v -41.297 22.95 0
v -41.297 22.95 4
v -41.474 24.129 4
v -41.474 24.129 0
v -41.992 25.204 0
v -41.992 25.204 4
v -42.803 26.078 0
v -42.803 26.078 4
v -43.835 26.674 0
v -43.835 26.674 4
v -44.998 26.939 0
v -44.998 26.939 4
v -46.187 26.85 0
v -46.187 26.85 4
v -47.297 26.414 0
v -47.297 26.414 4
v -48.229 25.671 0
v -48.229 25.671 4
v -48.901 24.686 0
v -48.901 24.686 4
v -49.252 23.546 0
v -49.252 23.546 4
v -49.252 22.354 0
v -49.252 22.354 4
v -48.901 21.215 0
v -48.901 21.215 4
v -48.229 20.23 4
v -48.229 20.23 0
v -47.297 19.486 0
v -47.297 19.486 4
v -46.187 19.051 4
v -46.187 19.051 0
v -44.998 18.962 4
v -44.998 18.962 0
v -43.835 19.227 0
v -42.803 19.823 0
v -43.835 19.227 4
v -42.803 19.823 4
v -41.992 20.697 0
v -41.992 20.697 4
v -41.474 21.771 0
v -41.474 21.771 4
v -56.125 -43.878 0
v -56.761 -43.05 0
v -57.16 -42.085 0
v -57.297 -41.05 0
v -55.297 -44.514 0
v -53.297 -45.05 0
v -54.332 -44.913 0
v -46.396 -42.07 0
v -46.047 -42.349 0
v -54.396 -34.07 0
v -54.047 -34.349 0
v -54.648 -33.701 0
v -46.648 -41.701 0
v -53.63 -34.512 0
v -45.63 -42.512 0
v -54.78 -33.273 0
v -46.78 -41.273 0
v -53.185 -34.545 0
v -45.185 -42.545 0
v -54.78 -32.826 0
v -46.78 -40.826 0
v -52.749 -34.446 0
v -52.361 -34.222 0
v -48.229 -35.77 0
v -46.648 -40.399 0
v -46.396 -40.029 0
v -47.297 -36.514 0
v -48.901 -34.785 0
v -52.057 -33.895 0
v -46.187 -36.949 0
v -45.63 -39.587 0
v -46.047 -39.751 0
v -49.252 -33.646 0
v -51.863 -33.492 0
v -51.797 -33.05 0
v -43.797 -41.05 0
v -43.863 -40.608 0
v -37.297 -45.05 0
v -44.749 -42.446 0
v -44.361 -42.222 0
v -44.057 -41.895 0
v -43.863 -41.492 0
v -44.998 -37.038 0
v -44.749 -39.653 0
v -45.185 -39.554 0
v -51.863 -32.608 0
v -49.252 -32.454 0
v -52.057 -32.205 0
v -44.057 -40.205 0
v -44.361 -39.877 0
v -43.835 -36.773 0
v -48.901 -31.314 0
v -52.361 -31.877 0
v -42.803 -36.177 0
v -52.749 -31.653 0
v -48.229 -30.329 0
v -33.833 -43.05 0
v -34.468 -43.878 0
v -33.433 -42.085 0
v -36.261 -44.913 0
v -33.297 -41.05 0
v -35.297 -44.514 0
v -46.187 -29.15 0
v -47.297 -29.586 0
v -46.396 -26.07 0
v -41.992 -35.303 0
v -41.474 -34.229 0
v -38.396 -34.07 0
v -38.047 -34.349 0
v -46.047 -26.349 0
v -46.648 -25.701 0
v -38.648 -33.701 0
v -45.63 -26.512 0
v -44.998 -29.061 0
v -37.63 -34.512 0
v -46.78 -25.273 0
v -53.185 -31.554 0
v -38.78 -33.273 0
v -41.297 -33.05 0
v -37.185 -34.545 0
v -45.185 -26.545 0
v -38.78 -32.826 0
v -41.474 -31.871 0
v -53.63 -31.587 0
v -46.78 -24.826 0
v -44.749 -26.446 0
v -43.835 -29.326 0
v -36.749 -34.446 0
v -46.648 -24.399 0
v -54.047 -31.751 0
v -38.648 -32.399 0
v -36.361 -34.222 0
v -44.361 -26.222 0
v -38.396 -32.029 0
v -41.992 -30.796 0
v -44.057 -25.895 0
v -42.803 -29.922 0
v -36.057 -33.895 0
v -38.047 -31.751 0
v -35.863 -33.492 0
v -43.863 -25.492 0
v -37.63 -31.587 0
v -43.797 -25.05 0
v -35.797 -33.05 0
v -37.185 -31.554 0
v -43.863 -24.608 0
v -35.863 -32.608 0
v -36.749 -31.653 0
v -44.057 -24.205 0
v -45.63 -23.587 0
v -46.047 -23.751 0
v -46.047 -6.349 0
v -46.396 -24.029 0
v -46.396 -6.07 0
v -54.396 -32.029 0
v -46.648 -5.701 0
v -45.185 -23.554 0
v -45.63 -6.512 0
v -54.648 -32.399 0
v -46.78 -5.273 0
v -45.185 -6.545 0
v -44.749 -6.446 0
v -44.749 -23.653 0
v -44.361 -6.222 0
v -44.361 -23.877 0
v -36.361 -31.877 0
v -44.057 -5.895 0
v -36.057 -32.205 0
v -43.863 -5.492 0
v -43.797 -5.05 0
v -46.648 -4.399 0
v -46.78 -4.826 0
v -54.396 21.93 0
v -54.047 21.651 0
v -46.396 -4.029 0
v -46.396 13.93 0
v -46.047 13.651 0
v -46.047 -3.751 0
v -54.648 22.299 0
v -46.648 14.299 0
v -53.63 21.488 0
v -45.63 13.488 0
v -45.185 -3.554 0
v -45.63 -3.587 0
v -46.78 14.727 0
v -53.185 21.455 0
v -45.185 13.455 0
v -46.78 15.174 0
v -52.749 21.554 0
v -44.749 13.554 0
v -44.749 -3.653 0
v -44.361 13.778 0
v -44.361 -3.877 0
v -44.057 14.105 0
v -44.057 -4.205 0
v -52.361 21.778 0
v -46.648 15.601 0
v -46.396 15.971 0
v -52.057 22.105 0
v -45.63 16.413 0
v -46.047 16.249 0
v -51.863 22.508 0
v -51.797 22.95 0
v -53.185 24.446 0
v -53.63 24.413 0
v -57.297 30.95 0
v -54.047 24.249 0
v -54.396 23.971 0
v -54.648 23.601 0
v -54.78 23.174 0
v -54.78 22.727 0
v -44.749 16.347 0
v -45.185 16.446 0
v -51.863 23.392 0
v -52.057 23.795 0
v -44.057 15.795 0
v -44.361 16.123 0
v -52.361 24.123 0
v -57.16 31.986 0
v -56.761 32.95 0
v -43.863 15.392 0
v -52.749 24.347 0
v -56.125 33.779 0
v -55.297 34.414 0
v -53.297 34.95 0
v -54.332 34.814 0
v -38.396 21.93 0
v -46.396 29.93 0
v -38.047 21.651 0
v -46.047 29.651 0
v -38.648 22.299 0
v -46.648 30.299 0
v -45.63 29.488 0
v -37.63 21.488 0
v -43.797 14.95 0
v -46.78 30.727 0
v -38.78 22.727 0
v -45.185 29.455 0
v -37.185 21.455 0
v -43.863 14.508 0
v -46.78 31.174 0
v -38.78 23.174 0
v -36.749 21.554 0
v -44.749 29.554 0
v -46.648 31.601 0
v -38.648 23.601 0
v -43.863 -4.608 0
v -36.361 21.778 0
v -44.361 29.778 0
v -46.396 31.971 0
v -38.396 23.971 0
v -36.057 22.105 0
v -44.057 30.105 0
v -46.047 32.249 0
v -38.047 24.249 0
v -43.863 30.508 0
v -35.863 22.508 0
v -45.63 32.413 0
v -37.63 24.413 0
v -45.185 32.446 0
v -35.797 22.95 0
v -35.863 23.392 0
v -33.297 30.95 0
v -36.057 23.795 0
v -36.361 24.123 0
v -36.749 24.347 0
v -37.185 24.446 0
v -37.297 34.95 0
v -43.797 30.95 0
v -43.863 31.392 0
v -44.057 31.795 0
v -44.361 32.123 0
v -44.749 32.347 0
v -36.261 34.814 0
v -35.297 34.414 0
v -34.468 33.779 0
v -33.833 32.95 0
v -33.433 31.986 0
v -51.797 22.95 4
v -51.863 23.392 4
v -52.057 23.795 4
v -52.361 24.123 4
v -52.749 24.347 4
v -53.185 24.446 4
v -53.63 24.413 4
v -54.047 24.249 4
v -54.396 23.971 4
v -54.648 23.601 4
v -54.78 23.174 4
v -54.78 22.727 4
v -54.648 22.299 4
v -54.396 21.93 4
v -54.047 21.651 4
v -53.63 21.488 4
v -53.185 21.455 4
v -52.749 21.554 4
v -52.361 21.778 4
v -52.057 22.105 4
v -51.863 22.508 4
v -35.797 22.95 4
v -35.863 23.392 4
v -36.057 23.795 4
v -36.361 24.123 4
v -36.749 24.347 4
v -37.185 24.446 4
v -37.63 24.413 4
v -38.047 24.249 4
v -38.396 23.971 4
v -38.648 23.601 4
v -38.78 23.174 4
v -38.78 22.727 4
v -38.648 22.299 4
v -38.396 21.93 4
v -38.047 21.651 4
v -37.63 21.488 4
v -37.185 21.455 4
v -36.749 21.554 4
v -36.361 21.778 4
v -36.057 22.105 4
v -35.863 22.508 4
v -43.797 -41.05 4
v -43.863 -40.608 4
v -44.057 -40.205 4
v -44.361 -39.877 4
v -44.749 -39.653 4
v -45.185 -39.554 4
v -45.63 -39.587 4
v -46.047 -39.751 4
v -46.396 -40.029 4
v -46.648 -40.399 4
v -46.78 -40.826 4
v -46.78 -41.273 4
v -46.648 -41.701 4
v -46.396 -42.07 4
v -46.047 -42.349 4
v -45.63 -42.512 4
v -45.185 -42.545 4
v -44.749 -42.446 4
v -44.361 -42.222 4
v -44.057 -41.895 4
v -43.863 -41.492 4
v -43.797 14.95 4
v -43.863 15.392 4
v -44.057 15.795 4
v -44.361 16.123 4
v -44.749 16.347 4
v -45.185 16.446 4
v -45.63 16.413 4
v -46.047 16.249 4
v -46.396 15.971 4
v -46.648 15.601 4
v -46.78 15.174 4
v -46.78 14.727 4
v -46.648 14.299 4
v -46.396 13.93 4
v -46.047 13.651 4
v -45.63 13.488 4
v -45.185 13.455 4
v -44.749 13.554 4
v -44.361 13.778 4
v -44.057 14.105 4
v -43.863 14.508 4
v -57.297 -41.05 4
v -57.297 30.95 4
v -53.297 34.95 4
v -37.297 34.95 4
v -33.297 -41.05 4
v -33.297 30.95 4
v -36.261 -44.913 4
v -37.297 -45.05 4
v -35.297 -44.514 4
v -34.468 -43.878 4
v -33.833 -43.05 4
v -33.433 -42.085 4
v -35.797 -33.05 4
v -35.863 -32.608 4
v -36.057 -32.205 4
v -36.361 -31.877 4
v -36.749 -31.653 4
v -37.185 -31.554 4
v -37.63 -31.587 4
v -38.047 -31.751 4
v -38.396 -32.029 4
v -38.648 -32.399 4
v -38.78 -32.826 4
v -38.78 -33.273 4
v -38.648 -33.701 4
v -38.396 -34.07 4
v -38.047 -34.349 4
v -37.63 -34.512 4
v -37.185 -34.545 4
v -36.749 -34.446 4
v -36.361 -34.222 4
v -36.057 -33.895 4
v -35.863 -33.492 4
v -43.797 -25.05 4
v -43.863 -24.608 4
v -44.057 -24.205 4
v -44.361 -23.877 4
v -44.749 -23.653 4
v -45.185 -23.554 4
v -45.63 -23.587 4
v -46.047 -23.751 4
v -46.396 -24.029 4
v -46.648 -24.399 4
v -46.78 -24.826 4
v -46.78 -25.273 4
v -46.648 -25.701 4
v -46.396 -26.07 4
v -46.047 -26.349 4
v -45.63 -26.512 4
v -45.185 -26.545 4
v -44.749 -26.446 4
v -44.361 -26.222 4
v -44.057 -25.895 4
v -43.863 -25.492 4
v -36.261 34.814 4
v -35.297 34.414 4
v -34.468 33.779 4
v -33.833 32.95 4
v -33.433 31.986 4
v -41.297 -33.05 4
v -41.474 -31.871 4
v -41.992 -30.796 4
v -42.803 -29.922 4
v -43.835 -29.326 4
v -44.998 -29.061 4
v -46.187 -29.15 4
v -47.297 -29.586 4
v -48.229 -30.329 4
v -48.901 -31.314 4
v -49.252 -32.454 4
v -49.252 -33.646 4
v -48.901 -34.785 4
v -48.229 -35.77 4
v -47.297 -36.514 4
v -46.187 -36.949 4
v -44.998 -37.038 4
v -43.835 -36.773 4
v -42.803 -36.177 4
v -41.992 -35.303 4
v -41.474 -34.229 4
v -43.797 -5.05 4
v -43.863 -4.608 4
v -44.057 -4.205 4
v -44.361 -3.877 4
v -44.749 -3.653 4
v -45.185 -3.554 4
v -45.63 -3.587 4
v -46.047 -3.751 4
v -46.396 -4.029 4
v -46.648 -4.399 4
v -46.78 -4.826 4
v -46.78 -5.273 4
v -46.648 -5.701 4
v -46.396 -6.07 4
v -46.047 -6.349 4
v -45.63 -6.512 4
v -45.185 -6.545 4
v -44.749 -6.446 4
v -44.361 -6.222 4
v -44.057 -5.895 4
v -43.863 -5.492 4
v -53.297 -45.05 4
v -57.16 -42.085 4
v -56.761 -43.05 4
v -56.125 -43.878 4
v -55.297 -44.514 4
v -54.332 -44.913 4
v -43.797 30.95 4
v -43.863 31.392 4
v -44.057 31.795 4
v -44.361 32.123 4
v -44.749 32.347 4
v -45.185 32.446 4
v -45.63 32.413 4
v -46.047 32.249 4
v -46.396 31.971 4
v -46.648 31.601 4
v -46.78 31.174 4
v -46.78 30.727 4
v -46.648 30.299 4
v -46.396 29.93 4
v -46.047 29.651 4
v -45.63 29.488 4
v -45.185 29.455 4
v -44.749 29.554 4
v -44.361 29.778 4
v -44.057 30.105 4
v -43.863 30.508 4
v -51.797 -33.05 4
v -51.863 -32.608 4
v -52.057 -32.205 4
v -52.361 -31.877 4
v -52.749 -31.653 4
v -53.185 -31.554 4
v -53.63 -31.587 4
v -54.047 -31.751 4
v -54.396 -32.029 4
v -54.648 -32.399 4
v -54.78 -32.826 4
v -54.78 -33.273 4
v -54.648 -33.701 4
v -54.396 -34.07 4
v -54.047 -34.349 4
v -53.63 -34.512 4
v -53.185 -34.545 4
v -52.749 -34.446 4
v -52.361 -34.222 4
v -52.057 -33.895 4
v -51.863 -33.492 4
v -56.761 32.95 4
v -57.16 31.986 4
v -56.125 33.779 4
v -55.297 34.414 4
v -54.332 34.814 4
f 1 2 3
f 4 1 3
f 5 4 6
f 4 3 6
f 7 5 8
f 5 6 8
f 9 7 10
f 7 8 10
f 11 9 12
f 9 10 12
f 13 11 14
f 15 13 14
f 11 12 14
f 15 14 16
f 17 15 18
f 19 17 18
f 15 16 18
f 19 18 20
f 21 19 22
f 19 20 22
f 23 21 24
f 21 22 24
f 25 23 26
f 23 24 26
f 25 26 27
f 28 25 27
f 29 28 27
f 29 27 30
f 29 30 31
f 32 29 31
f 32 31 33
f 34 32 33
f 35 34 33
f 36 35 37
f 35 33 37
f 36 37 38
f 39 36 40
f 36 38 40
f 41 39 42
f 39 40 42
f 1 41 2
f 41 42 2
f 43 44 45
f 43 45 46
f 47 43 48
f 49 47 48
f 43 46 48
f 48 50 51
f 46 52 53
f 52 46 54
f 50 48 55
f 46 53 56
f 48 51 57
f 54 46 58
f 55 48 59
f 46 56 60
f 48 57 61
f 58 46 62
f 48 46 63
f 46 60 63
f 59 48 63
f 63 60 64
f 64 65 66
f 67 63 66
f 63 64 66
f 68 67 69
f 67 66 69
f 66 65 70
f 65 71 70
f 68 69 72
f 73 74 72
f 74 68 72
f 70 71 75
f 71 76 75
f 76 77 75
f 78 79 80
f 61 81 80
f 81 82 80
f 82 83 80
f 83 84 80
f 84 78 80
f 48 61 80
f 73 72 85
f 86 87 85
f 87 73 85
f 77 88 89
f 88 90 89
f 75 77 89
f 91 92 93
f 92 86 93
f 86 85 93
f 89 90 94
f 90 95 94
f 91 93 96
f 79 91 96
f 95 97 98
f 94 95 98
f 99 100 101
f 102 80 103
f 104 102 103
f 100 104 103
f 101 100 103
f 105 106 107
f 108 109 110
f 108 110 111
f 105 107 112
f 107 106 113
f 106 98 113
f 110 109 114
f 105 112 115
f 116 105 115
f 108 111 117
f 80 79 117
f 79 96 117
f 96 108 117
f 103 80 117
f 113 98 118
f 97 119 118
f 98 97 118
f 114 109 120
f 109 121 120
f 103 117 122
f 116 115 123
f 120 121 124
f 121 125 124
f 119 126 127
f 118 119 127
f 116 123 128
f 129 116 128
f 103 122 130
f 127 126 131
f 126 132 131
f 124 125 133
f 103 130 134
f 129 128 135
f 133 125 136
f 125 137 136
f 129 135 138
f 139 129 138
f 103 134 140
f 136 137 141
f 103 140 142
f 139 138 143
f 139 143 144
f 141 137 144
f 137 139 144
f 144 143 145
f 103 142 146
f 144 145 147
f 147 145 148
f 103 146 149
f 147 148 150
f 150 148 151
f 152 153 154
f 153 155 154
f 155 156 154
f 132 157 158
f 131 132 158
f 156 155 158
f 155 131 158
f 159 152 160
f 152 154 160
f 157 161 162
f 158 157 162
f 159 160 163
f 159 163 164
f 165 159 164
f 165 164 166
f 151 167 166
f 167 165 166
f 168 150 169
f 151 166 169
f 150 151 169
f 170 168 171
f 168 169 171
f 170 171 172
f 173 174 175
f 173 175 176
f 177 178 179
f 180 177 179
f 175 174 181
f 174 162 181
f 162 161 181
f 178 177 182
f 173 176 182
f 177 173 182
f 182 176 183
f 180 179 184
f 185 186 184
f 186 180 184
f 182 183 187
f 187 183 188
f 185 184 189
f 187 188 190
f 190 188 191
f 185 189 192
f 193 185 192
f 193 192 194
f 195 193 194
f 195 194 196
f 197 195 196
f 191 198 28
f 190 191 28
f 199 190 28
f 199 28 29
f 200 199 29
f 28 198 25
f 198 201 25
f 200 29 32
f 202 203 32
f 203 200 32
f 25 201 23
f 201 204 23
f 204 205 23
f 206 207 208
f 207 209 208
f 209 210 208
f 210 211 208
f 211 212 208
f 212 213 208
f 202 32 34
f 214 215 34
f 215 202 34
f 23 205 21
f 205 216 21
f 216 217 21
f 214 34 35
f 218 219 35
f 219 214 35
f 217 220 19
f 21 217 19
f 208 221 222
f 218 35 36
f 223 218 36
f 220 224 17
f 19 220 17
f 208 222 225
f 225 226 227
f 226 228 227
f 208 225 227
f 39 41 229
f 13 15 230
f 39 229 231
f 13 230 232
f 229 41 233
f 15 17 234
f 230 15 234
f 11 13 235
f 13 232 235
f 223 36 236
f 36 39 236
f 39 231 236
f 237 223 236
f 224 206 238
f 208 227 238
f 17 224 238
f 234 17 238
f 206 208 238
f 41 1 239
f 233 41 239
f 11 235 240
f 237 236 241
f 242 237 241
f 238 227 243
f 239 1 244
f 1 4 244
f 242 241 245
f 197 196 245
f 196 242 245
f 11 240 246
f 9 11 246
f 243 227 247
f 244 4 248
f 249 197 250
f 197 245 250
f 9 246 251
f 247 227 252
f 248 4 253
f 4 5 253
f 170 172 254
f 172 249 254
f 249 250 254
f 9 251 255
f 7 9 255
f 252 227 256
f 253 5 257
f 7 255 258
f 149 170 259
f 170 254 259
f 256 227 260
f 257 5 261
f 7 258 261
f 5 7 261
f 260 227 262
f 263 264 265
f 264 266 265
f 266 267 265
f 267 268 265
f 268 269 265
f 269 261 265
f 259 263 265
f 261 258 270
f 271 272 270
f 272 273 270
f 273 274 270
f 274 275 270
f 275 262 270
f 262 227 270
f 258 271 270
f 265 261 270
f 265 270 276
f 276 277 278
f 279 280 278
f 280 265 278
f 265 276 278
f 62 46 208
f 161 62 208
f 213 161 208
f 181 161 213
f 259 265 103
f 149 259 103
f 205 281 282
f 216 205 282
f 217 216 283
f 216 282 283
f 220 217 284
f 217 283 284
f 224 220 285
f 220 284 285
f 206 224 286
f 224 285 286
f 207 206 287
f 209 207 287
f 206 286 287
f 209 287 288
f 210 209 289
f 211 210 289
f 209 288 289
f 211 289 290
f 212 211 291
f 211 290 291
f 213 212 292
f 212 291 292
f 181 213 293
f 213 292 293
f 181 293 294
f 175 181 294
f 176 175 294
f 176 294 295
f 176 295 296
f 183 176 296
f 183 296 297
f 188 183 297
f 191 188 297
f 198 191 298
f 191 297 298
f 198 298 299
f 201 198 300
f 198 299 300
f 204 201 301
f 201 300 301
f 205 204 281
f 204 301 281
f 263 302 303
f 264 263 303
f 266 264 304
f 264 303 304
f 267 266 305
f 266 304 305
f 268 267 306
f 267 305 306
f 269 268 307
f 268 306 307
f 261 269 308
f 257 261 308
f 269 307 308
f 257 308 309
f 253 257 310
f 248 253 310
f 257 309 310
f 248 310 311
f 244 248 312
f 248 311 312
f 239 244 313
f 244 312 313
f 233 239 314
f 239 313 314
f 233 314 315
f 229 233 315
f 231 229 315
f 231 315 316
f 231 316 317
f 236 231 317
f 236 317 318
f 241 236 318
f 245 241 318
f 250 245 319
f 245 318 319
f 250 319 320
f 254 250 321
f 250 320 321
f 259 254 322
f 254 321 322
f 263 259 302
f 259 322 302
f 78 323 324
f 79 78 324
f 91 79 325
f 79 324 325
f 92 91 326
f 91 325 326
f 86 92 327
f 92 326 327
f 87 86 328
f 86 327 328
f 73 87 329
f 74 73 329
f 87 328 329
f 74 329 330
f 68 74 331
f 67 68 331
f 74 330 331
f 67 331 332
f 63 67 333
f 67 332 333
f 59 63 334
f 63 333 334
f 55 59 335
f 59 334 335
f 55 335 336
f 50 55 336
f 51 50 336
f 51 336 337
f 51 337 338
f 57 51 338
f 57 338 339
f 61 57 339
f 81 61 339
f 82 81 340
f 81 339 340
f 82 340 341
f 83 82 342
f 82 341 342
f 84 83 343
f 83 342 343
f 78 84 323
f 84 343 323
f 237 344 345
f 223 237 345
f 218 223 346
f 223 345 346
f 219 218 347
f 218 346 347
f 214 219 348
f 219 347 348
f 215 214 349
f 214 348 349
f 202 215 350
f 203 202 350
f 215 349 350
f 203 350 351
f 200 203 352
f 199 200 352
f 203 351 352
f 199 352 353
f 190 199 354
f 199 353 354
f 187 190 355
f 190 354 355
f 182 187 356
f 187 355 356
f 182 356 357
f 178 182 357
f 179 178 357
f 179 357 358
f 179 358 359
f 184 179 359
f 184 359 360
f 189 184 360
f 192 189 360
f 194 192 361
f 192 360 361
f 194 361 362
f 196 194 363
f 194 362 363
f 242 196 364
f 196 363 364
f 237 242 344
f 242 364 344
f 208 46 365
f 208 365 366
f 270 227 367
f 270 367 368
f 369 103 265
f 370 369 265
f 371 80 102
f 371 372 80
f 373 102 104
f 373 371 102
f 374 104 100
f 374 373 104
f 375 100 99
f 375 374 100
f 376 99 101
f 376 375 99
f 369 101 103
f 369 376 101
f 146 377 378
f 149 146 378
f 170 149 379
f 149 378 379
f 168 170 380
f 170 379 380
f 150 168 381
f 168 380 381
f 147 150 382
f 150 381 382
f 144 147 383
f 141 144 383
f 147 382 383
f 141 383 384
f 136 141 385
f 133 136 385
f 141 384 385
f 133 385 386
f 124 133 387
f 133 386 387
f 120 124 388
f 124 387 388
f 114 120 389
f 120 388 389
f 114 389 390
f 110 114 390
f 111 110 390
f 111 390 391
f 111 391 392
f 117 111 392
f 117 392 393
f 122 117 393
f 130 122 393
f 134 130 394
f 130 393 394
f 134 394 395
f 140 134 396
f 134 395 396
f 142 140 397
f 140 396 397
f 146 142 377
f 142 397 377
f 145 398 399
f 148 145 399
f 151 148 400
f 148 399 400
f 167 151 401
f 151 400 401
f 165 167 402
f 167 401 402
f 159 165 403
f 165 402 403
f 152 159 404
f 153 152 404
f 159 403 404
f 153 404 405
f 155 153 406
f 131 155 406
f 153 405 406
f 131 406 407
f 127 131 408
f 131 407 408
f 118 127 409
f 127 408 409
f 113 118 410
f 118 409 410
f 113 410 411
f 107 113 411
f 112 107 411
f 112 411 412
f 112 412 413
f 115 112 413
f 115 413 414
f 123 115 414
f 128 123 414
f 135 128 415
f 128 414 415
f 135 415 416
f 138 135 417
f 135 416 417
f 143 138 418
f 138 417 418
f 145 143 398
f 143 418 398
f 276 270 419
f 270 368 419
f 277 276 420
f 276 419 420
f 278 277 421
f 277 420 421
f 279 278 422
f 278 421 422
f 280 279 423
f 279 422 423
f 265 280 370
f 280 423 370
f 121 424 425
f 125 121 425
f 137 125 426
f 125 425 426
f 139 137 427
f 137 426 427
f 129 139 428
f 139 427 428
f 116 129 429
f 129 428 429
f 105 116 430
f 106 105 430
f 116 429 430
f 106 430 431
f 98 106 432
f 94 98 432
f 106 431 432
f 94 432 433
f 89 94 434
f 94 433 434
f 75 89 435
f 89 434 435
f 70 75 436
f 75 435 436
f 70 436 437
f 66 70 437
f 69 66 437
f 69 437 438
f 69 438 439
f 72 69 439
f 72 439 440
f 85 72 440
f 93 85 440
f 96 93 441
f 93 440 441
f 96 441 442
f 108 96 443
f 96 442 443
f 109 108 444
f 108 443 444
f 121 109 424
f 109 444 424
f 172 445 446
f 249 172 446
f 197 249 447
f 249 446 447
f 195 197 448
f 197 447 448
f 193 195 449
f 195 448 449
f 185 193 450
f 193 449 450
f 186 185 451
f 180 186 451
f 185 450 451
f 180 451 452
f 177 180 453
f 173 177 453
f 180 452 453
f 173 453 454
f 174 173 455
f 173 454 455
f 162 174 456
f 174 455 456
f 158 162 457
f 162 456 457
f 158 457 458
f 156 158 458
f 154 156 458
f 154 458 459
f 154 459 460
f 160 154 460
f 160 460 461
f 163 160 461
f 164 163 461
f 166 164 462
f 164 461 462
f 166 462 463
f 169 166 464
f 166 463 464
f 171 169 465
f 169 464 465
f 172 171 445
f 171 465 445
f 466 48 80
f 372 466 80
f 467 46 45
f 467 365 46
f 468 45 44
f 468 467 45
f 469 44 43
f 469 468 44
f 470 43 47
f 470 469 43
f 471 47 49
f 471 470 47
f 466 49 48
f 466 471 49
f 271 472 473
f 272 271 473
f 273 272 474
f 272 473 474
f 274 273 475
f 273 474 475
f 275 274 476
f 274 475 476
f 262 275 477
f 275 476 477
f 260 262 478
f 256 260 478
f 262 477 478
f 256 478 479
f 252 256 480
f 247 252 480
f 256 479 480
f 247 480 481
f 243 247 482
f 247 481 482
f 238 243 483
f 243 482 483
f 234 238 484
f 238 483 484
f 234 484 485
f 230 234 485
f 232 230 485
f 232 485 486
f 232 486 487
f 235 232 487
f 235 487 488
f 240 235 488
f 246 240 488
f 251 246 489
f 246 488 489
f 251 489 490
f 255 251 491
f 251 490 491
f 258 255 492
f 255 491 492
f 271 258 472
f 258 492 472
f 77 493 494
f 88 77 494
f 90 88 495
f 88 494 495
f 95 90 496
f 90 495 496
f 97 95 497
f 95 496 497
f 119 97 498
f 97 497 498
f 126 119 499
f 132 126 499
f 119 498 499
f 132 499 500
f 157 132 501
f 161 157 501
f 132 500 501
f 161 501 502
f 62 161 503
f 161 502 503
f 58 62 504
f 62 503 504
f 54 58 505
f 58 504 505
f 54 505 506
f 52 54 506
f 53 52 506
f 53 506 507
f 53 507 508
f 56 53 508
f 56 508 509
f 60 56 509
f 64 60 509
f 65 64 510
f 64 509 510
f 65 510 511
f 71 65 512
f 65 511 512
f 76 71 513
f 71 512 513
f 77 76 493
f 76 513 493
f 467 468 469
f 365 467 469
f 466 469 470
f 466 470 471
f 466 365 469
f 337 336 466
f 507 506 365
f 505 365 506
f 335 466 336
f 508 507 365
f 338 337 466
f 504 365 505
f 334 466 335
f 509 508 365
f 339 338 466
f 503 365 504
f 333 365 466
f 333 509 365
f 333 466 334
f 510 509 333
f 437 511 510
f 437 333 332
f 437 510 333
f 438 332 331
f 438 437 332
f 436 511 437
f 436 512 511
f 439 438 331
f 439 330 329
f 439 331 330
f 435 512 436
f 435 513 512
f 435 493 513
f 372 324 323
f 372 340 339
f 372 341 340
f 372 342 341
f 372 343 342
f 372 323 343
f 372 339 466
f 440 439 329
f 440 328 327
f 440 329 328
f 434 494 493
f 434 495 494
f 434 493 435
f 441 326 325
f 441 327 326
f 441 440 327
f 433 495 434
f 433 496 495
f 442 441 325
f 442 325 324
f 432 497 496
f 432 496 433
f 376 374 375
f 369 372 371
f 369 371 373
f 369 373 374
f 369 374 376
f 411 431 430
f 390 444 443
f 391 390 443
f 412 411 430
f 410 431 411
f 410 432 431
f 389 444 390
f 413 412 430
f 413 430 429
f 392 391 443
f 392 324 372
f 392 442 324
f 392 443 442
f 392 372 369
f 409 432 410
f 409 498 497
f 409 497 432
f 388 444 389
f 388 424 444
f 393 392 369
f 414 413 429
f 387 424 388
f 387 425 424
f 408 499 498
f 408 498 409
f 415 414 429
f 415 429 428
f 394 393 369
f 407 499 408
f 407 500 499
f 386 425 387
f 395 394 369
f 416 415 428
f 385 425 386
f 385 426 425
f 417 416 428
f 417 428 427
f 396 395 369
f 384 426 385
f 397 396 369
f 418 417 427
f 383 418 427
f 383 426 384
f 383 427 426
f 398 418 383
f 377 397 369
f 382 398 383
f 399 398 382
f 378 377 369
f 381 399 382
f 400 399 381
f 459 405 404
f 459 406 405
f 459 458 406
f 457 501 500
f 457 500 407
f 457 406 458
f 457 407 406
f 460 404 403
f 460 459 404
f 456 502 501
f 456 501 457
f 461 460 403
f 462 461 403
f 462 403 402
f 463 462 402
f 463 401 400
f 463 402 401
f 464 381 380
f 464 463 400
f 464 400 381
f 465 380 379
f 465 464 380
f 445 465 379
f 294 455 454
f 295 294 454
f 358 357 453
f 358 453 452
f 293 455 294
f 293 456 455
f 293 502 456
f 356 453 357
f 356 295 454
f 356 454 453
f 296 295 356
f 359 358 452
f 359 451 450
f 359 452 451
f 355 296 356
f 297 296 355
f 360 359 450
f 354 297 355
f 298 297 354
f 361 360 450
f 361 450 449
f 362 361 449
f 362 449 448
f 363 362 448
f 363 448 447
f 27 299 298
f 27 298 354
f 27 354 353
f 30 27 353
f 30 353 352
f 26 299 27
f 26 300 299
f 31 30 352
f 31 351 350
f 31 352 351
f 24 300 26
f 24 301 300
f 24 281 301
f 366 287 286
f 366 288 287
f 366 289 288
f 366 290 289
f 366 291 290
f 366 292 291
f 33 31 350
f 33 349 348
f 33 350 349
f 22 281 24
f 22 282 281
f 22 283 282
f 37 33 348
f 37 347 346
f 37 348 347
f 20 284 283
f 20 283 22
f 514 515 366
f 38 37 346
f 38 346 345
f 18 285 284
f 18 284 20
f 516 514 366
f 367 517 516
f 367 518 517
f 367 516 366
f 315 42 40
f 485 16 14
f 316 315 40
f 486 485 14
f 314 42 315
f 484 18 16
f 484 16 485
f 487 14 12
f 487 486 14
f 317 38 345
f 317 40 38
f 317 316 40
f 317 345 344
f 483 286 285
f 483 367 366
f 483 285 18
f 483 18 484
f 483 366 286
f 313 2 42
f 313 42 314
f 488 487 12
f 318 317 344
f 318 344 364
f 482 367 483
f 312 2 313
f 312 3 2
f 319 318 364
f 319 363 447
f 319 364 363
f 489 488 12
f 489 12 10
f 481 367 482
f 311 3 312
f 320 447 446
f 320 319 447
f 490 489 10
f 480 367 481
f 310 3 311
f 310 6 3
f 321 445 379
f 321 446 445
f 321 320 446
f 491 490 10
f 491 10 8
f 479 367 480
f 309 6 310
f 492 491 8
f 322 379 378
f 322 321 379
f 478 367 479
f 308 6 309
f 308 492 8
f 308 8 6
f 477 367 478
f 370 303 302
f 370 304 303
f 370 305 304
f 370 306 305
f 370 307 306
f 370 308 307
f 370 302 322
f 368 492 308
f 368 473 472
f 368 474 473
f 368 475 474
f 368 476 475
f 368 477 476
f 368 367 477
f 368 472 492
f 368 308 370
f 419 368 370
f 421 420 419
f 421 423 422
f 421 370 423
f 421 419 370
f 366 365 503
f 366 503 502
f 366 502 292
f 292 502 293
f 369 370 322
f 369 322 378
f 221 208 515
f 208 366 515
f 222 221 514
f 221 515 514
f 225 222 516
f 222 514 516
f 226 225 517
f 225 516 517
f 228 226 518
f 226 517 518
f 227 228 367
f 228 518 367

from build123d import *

# Parameters (mm, degrees)
SKETCH1_W           = 24
SKETCH1_H           = 80
BOSS_EXTRUDE1_DEPTH = 4
SKETCH2_R           = 4
SKETCH2_R_2         = 1.5
CUT_EXTRUDE1_DEPTH  = 4
FILLET1_R           = 4
SKETCH3_R           = 1.5
CUT_EXTRUDE2_DEPTH  = 4


with BuildPart() as part:
    # Sketch1 → Boss-Extrude1 (new body)
    with BuildSketch(Plane.XY):
        with Locations((-45.296675466, -5.049681021)):
            Rectangle(SKETCH1_W, SKETCH1_H)
    extrude(amount=BOSS_EXTRUDE1_DEPTH)

    # Sketch2 → Cut-Extrude1 (cut)
    with BuildSketch(Plane.XY.offset(4)):
        with Locations((-45.296675466, -33.049681021)):
            Circle(SKETCH2_R)
        with Locations((-37.296675466, -33.049681021)):
            Circle(SKETCH2_R_2)
        with Locations((-45.296675466, -41.049681021)):
            Circle(SKETCH2_R_2)
        with Locations((-53.296675466, -33.049681021)):
            Circle(SKETCH2_R_2)
        with Locations((-45.296675466, -25.049681021)):
            Circle(SKETCH2_R_2)
        with Locations((-45.296675466, 30.950318979)):
            Circle(SKETCH2_R_2)
        with Locations((-37.296675466, 22.950318979)):
            Circle(SKETCH2_R_2)
        with Locations((-45.296675466, 14.950318979)):
            Circle(SKETCH2_R_2)
        with Locations((-53.296675466, 22.950318979)):
            Circle(SKETCH2_R_2)
        with Locations((-45.296675466, 22.950318979)):
            Circle(SKETCH2_R)
    extrude(amount=-CUT_EXTRUDE1_DEPTH, mode=Mode.SUBTRACT)

    # Fillet1
    fillet1_edges = [part.edges().sort_by_distance(p)[0] for p in [
        (-57.296675466, 34.950318979, 2),
        (-57.296675466, -45.049681021, 2),
        (-33.296675466, -45.049681021, 2),
        (-33.296675466, 34.950318979, 2),
    ]]
    fillet(fillet1_edges, radius=FILLET1_R)

    # Sketch3 → Cut-Extrude2 (cut)
    with BuildSketch(Plane.XY.offset(4)):
        with Locations((-45.296675466, -5.049681021)):
            Circle(SKETCH3_R)
    extrude(amount=-CUT_EXTRUDE2_DEPTH, mode=Mode.SUBTRACT)


solid = part.part
